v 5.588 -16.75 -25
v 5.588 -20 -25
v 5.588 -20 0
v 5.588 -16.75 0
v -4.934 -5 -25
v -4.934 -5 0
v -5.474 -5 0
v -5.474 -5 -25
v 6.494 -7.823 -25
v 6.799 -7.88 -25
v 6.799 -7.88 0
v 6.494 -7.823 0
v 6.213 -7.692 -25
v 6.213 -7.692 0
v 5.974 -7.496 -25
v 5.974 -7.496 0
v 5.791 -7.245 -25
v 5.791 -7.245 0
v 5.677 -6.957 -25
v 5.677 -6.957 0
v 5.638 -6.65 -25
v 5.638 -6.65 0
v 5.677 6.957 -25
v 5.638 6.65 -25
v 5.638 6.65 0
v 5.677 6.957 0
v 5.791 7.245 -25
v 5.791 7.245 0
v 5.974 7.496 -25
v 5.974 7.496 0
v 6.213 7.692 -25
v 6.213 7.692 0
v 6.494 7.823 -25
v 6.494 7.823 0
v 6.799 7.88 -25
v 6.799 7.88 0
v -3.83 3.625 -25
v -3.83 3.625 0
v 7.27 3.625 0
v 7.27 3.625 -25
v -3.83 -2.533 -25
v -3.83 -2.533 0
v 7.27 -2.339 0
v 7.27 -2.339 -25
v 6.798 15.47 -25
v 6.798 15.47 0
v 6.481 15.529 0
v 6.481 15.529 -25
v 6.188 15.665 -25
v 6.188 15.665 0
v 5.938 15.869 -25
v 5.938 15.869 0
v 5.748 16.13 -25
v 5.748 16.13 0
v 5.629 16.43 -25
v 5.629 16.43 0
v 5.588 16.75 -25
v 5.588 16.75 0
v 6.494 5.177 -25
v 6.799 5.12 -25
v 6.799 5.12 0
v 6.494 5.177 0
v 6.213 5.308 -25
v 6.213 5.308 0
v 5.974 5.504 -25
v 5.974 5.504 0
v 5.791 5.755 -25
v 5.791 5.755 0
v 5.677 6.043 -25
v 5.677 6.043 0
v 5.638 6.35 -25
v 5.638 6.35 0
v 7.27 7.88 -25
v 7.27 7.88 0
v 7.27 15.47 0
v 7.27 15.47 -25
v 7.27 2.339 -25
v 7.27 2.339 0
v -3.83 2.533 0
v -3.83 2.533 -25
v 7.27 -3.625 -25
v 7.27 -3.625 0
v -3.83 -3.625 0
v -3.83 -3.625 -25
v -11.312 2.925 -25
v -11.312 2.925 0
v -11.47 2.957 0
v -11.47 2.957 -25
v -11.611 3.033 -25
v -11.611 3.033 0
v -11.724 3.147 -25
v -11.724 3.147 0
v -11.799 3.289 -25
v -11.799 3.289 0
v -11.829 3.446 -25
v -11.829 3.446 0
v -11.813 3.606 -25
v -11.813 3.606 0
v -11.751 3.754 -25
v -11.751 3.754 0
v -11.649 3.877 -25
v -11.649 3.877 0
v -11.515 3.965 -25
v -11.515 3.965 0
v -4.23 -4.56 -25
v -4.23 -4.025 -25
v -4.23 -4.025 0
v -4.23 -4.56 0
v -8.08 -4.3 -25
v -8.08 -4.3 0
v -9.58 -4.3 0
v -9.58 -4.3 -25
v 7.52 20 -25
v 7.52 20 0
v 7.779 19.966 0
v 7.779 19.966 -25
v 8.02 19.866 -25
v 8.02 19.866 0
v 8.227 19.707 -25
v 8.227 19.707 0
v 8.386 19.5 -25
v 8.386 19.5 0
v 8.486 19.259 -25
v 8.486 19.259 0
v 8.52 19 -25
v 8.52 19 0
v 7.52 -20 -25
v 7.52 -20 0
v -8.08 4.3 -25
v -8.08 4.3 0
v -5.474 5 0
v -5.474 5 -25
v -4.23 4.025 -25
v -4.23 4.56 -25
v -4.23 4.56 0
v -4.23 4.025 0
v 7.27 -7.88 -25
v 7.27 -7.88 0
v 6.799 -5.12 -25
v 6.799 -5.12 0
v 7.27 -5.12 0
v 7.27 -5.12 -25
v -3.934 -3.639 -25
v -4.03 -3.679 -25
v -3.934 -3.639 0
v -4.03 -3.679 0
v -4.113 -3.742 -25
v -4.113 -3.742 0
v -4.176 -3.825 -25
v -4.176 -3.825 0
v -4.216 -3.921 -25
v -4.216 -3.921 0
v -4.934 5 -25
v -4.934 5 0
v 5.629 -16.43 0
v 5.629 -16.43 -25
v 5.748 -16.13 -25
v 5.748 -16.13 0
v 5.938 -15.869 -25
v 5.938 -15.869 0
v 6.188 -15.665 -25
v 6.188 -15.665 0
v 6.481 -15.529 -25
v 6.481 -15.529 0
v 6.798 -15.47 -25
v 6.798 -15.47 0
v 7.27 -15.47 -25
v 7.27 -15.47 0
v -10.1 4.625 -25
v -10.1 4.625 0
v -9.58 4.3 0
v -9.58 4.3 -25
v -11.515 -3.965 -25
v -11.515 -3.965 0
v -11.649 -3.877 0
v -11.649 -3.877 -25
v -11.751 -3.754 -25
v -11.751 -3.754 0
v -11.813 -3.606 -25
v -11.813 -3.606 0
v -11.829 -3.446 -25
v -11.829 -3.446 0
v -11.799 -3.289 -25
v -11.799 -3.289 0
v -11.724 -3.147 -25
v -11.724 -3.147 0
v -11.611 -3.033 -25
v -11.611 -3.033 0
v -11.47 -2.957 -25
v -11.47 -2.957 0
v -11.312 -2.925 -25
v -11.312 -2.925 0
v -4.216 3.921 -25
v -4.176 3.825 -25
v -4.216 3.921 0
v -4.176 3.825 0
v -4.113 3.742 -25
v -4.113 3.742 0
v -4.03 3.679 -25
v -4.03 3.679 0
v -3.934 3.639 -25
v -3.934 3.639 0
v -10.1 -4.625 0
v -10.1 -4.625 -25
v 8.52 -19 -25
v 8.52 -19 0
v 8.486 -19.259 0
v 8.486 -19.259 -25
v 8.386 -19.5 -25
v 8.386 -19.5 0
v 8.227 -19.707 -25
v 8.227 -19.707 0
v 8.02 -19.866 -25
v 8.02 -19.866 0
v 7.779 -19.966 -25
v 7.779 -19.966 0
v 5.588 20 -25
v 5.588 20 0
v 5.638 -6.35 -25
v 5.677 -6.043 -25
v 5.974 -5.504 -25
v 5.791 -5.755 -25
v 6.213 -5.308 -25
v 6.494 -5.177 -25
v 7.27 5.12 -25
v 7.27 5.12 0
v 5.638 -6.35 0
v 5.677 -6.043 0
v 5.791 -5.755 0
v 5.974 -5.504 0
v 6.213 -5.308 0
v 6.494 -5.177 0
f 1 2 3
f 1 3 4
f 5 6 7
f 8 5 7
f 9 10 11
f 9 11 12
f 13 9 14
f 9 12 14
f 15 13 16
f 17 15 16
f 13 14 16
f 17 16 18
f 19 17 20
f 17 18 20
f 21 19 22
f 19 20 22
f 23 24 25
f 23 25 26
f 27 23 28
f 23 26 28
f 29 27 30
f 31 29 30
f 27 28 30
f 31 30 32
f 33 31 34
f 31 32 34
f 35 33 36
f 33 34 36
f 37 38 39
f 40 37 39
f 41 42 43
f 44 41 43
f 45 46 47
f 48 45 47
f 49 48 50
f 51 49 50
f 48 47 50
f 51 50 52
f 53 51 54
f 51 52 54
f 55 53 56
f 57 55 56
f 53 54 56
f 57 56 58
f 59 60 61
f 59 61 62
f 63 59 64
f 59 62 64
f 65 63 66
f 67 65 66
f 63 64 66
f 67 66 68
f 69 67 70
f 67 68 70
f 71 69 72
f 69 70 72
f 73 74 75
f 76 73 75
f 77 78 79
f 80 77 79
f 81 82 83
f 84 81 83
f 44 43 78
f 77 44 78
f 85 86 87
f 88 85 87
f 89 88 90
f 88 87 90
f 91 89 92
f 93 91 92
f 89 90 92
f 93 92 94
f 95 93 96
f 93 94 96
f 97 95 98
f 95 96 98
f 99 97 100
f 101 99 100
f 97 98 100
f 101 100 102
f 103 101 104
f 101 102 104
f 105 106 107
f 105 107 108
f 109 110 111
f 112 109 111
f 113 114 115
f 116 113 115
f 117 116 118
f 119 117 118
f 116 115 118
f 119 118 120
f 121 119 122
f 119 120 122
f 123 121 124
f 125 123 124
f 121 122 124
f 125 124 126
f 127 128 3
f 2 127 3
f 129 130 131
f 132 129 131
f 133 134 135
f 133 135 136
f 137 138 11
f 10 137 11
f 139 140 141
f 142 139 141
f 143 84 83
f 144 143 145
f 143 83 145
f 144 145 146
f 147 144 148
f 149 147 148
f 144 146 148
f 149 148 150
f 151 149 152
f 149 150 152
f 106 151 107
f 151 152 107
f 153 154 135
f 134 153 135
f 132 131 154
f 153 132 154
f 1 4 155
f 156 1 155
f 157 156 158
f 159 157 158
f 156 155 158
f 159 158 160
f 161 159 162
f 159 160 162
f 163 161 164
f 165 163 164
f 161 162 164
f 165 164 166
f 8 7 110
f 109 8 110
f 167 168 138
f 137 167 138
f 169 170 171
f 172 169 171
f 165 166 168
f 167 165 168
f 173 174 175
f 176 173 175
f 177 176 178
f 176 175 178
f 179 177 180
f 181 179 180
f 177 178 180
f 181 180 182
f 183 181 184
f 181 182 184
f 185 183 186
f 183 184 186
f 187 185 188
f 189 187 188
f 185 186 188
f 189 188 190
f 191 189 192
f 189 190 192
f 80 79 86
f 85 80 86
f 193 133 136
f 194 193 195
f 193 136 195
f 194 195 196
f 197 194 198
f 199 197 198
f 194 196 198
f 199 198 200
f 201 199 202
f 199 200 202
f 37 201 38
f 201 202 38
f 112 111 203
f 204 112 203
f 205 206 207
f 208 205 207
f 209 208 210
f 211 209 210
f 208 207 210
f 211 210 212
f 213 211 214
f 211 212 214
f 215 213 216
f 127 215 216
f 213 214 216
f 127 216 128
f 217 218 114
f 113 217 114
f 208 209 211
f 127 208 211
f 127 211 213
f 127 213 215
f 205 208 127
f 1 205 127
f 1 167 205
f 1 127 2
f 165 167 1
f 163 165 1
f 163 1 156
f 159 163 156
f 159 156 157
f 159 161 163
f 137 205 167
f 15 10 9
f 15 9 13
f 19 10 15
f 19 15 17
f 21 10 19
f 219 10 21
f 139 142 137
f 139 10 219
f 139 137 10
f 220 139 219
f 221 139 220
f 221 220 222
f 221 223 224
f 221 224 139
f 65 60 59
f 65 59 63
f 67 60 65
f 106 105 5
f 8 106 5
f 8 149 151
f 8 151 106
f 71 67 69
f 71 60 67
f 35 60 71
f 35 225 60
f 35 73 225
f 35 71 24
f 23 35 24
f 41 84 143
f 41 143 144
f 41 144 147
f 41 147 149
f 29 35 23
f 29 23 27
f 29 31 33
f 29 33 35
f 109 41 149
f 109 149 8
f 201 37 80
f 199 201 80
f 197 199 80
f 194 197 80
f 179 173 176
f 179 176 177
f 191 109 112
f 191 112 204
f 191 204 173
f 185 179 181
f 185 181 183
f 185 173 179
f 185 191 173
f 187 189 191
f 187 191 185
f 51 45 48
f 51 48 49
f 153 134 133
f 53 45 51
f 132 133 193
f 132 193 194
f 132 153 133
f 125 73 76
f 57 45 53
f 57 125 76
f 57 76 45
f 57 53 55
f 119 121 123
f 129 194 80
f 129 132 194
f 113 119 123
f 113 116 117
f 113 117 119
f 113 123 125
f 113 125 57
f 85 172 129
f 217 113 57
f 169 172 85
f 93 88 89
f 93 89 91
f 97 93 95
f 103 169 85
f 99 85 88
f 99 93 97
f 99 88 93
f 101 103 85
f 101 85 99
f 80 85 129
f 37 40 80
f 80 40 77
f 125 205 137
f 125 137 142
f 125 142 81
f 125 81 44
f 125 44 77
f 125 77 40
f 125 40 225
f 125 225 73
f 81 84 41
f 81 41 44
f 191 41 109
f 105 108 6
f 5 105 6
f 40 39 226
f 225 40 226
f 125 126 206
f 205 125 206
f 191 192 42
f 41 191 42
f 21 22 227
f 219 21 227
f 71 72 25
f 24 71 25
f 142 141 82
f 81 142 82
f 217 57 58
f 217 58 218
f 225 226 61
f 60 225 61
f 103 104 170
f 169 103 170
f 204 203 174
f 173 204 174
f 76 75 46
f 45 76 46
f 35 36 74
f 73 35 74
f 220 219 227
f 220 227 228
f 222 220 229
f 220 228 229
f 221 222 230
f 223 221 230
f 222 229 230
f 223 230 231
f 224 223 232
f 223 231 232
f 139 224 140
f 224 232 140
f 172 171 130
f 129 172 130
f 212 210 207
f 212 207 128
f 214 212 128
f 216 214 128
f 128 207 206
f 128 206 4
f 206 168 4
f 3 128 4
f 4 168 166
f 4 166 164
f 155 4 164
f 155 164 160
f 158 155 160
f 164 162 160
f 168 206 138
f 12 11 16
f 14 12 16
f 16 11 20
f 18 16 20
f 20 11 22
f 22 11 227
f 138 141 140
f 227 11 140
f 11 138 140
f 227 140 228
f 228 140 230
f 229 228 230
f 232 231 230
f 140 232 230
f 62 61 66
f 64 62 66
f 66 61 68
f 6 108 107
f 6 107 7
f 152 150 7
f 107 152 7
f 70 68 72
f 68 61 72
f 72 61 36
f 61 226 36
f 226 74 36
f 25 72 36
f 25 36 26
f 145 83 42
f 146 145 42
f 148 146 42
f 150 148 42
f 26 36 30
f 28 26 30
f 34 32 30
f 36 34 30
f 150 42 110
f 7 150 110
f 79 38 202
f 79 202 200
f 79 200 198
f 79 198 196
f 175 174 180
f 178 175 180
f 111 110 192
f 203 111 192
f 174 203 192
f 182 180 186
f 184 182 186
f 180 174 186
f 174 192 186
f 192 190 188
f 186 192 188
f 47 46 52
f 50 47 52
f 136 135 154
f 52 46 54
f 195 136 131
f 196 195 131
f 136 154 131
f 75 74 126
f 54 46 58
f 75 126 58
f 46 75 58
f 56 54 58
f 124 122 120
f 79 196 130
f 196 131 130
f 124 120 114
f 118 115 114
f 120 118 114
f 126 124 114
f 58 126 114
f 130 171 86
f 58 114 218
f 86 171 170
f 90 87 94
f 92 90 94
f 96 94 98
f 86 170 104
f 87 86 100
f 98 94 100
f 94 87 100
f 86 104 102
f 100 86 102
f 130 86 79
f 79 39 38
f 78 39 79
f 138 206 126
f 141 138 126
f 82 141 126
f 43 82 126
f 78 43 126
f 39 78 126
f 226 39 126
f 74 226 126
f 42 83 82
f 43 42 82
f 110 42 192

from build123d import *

# Parameters (mm, degrees)
MAIN_EXTRUSION_DEPTH = 25


with BuildPart() as part:
    # Sk Main Extrusion → Main Extrusion (new body)
    with BuildSketch(Plane.XY):
        with BuildLine():
            Line((-3.83, 2.5328), (-11.31249103, 2.925083334))
            ThreePointArc((-11.31249103, 2.925083334), (-11.819967595, 3.366238681), (-11.514691833, 3.965369062))
            Line((-11.514691833, 3.965369062), (-10.100108722, 4.625))
            Line((-10.100108722, 4.625), (-9.58, 4.3))
            Line((-9.58, 4.3), (-8.08, 4.3))
            Line((-8.08, 4.3), (-5.474147193, 5))
            Line((-5.474147193, 5), (-4.934147193, 5))
            Line((-4.934147193, 5), (-4.23, 4.56))
            Line((-4.23, 4.56), (-4.23, 4.025))
            ThreePointArc((-4.23, 4.025), (-4.112842712, 3.742157288), (-3.83, 3.625))
            Line((-3.83, 3.625), (7.27, 3.625))
            Line((7.27, 3.625), (7.27, 5.120055168))
            Line((7.27, 5.120055168), (6.79886836, 5.120055168))
            ThreePointArc((6.79886836, 5.120055168), (5.9740485, 5.504367154), (5.638, 6.35))
            Line((5.638, 6.35), (5.638, 6.65))
            ThreePointArc((5.638, 6.65), (5.9740485, 7.495632846), (6.79886836, 7.879944832))
            Line((6.79886836, 7.879944832), (7.27, 7.879944832))
            Line((7.27, 7.879944832), (7.27, 15.470020156))
            Line((7.27, 15.470020156), (6.798058361, 15.470020156))
            ThreePointArc((6.798058361, 15.470020156), (5.938401057, 15.86929153), (5.588, 16.75))
            Line((5.588, 16.75), (5.588, 20))
            Line((5.588, 20), (7.52, 20))
            ThreePointArc((7.52, 20), (8.227106781, 19.707106781), (8.52, 19))
            Line((8.52, 19), (8.52, -19))
            ThreePointArc((8.52, -19), (8.227106781, -19.707106781), (7.52, -20))
            Line((7.52, -20), (5.588, -20))
            Line((5.588, -20), (5.588, -16.75))
            ThreePointArc((5.588, -16.75), (5.938401057, -15.86929153), (6.798058361, -15.470020156))
            Line((6.798058361, -15.470020156), (7.27, -15.470020156))
            Line((7.27, -15.470020156), (7.27, -7.879944832))
            Line((7.27, -7.879944832), (6.79886836, -7.879944832))
            ThreePointArc((6.79886836, -7.879944832), (5.9740485, -7.495632846), (5.638, -6.65))
            Line((5.638, -6.65), (5.638, -6.35))
            ThreePointArc((5.638, -6.35), (5.9740485, -5.504367154), (6.79886836, -5.120055168))
            Line((6.79886836, -5.120055168), (7.27, -5.120055168))
            Line((7.27, -5.120055168), (7.27, -3.625))
            Line((7.27, -3.625), (-3.83, -3.625))
            ThreePointArc((-3.83, -3.625), (-4.112842712, -3.742157288), (-4.23, -4.025))
            Line((-4.23, -4.025), (-4.23, -4.56))
            Line((-4.23, -4.56), (-4.934147193, -5))
            Line((-4.934147193, -5), (-5.474147193, -5))
            Line((-5.474147193, -5), (-8.08, -4.3))
            Line((-8.08, -4.3), (-9.58, -4.3))
            Line((-9.58, -4.3), (-10.100108722, -4.625))
            Line((-10.100108722, -4.625), (-11.514691833, -3.965369062))
            ThreePointArc((-11.514691833, -3.965369062), (-11.819967595, -3.366238681), (-11.31249103, -2.925083334))
            Line((-11.31249103, -2.925083334), (-3.83, -2.5328))
            Line((-3.83, -2.5328), (7.27, -2.339048779))
            Line((7.27, -2.339048779), (7.27, 2.339048779))
            Line((7.27, 2.339048779), (-3.83, 2.5328))
        make_face()
    extrude(amount=-MAIN_EXTRUSION_DEPTH)


solid = part.part
